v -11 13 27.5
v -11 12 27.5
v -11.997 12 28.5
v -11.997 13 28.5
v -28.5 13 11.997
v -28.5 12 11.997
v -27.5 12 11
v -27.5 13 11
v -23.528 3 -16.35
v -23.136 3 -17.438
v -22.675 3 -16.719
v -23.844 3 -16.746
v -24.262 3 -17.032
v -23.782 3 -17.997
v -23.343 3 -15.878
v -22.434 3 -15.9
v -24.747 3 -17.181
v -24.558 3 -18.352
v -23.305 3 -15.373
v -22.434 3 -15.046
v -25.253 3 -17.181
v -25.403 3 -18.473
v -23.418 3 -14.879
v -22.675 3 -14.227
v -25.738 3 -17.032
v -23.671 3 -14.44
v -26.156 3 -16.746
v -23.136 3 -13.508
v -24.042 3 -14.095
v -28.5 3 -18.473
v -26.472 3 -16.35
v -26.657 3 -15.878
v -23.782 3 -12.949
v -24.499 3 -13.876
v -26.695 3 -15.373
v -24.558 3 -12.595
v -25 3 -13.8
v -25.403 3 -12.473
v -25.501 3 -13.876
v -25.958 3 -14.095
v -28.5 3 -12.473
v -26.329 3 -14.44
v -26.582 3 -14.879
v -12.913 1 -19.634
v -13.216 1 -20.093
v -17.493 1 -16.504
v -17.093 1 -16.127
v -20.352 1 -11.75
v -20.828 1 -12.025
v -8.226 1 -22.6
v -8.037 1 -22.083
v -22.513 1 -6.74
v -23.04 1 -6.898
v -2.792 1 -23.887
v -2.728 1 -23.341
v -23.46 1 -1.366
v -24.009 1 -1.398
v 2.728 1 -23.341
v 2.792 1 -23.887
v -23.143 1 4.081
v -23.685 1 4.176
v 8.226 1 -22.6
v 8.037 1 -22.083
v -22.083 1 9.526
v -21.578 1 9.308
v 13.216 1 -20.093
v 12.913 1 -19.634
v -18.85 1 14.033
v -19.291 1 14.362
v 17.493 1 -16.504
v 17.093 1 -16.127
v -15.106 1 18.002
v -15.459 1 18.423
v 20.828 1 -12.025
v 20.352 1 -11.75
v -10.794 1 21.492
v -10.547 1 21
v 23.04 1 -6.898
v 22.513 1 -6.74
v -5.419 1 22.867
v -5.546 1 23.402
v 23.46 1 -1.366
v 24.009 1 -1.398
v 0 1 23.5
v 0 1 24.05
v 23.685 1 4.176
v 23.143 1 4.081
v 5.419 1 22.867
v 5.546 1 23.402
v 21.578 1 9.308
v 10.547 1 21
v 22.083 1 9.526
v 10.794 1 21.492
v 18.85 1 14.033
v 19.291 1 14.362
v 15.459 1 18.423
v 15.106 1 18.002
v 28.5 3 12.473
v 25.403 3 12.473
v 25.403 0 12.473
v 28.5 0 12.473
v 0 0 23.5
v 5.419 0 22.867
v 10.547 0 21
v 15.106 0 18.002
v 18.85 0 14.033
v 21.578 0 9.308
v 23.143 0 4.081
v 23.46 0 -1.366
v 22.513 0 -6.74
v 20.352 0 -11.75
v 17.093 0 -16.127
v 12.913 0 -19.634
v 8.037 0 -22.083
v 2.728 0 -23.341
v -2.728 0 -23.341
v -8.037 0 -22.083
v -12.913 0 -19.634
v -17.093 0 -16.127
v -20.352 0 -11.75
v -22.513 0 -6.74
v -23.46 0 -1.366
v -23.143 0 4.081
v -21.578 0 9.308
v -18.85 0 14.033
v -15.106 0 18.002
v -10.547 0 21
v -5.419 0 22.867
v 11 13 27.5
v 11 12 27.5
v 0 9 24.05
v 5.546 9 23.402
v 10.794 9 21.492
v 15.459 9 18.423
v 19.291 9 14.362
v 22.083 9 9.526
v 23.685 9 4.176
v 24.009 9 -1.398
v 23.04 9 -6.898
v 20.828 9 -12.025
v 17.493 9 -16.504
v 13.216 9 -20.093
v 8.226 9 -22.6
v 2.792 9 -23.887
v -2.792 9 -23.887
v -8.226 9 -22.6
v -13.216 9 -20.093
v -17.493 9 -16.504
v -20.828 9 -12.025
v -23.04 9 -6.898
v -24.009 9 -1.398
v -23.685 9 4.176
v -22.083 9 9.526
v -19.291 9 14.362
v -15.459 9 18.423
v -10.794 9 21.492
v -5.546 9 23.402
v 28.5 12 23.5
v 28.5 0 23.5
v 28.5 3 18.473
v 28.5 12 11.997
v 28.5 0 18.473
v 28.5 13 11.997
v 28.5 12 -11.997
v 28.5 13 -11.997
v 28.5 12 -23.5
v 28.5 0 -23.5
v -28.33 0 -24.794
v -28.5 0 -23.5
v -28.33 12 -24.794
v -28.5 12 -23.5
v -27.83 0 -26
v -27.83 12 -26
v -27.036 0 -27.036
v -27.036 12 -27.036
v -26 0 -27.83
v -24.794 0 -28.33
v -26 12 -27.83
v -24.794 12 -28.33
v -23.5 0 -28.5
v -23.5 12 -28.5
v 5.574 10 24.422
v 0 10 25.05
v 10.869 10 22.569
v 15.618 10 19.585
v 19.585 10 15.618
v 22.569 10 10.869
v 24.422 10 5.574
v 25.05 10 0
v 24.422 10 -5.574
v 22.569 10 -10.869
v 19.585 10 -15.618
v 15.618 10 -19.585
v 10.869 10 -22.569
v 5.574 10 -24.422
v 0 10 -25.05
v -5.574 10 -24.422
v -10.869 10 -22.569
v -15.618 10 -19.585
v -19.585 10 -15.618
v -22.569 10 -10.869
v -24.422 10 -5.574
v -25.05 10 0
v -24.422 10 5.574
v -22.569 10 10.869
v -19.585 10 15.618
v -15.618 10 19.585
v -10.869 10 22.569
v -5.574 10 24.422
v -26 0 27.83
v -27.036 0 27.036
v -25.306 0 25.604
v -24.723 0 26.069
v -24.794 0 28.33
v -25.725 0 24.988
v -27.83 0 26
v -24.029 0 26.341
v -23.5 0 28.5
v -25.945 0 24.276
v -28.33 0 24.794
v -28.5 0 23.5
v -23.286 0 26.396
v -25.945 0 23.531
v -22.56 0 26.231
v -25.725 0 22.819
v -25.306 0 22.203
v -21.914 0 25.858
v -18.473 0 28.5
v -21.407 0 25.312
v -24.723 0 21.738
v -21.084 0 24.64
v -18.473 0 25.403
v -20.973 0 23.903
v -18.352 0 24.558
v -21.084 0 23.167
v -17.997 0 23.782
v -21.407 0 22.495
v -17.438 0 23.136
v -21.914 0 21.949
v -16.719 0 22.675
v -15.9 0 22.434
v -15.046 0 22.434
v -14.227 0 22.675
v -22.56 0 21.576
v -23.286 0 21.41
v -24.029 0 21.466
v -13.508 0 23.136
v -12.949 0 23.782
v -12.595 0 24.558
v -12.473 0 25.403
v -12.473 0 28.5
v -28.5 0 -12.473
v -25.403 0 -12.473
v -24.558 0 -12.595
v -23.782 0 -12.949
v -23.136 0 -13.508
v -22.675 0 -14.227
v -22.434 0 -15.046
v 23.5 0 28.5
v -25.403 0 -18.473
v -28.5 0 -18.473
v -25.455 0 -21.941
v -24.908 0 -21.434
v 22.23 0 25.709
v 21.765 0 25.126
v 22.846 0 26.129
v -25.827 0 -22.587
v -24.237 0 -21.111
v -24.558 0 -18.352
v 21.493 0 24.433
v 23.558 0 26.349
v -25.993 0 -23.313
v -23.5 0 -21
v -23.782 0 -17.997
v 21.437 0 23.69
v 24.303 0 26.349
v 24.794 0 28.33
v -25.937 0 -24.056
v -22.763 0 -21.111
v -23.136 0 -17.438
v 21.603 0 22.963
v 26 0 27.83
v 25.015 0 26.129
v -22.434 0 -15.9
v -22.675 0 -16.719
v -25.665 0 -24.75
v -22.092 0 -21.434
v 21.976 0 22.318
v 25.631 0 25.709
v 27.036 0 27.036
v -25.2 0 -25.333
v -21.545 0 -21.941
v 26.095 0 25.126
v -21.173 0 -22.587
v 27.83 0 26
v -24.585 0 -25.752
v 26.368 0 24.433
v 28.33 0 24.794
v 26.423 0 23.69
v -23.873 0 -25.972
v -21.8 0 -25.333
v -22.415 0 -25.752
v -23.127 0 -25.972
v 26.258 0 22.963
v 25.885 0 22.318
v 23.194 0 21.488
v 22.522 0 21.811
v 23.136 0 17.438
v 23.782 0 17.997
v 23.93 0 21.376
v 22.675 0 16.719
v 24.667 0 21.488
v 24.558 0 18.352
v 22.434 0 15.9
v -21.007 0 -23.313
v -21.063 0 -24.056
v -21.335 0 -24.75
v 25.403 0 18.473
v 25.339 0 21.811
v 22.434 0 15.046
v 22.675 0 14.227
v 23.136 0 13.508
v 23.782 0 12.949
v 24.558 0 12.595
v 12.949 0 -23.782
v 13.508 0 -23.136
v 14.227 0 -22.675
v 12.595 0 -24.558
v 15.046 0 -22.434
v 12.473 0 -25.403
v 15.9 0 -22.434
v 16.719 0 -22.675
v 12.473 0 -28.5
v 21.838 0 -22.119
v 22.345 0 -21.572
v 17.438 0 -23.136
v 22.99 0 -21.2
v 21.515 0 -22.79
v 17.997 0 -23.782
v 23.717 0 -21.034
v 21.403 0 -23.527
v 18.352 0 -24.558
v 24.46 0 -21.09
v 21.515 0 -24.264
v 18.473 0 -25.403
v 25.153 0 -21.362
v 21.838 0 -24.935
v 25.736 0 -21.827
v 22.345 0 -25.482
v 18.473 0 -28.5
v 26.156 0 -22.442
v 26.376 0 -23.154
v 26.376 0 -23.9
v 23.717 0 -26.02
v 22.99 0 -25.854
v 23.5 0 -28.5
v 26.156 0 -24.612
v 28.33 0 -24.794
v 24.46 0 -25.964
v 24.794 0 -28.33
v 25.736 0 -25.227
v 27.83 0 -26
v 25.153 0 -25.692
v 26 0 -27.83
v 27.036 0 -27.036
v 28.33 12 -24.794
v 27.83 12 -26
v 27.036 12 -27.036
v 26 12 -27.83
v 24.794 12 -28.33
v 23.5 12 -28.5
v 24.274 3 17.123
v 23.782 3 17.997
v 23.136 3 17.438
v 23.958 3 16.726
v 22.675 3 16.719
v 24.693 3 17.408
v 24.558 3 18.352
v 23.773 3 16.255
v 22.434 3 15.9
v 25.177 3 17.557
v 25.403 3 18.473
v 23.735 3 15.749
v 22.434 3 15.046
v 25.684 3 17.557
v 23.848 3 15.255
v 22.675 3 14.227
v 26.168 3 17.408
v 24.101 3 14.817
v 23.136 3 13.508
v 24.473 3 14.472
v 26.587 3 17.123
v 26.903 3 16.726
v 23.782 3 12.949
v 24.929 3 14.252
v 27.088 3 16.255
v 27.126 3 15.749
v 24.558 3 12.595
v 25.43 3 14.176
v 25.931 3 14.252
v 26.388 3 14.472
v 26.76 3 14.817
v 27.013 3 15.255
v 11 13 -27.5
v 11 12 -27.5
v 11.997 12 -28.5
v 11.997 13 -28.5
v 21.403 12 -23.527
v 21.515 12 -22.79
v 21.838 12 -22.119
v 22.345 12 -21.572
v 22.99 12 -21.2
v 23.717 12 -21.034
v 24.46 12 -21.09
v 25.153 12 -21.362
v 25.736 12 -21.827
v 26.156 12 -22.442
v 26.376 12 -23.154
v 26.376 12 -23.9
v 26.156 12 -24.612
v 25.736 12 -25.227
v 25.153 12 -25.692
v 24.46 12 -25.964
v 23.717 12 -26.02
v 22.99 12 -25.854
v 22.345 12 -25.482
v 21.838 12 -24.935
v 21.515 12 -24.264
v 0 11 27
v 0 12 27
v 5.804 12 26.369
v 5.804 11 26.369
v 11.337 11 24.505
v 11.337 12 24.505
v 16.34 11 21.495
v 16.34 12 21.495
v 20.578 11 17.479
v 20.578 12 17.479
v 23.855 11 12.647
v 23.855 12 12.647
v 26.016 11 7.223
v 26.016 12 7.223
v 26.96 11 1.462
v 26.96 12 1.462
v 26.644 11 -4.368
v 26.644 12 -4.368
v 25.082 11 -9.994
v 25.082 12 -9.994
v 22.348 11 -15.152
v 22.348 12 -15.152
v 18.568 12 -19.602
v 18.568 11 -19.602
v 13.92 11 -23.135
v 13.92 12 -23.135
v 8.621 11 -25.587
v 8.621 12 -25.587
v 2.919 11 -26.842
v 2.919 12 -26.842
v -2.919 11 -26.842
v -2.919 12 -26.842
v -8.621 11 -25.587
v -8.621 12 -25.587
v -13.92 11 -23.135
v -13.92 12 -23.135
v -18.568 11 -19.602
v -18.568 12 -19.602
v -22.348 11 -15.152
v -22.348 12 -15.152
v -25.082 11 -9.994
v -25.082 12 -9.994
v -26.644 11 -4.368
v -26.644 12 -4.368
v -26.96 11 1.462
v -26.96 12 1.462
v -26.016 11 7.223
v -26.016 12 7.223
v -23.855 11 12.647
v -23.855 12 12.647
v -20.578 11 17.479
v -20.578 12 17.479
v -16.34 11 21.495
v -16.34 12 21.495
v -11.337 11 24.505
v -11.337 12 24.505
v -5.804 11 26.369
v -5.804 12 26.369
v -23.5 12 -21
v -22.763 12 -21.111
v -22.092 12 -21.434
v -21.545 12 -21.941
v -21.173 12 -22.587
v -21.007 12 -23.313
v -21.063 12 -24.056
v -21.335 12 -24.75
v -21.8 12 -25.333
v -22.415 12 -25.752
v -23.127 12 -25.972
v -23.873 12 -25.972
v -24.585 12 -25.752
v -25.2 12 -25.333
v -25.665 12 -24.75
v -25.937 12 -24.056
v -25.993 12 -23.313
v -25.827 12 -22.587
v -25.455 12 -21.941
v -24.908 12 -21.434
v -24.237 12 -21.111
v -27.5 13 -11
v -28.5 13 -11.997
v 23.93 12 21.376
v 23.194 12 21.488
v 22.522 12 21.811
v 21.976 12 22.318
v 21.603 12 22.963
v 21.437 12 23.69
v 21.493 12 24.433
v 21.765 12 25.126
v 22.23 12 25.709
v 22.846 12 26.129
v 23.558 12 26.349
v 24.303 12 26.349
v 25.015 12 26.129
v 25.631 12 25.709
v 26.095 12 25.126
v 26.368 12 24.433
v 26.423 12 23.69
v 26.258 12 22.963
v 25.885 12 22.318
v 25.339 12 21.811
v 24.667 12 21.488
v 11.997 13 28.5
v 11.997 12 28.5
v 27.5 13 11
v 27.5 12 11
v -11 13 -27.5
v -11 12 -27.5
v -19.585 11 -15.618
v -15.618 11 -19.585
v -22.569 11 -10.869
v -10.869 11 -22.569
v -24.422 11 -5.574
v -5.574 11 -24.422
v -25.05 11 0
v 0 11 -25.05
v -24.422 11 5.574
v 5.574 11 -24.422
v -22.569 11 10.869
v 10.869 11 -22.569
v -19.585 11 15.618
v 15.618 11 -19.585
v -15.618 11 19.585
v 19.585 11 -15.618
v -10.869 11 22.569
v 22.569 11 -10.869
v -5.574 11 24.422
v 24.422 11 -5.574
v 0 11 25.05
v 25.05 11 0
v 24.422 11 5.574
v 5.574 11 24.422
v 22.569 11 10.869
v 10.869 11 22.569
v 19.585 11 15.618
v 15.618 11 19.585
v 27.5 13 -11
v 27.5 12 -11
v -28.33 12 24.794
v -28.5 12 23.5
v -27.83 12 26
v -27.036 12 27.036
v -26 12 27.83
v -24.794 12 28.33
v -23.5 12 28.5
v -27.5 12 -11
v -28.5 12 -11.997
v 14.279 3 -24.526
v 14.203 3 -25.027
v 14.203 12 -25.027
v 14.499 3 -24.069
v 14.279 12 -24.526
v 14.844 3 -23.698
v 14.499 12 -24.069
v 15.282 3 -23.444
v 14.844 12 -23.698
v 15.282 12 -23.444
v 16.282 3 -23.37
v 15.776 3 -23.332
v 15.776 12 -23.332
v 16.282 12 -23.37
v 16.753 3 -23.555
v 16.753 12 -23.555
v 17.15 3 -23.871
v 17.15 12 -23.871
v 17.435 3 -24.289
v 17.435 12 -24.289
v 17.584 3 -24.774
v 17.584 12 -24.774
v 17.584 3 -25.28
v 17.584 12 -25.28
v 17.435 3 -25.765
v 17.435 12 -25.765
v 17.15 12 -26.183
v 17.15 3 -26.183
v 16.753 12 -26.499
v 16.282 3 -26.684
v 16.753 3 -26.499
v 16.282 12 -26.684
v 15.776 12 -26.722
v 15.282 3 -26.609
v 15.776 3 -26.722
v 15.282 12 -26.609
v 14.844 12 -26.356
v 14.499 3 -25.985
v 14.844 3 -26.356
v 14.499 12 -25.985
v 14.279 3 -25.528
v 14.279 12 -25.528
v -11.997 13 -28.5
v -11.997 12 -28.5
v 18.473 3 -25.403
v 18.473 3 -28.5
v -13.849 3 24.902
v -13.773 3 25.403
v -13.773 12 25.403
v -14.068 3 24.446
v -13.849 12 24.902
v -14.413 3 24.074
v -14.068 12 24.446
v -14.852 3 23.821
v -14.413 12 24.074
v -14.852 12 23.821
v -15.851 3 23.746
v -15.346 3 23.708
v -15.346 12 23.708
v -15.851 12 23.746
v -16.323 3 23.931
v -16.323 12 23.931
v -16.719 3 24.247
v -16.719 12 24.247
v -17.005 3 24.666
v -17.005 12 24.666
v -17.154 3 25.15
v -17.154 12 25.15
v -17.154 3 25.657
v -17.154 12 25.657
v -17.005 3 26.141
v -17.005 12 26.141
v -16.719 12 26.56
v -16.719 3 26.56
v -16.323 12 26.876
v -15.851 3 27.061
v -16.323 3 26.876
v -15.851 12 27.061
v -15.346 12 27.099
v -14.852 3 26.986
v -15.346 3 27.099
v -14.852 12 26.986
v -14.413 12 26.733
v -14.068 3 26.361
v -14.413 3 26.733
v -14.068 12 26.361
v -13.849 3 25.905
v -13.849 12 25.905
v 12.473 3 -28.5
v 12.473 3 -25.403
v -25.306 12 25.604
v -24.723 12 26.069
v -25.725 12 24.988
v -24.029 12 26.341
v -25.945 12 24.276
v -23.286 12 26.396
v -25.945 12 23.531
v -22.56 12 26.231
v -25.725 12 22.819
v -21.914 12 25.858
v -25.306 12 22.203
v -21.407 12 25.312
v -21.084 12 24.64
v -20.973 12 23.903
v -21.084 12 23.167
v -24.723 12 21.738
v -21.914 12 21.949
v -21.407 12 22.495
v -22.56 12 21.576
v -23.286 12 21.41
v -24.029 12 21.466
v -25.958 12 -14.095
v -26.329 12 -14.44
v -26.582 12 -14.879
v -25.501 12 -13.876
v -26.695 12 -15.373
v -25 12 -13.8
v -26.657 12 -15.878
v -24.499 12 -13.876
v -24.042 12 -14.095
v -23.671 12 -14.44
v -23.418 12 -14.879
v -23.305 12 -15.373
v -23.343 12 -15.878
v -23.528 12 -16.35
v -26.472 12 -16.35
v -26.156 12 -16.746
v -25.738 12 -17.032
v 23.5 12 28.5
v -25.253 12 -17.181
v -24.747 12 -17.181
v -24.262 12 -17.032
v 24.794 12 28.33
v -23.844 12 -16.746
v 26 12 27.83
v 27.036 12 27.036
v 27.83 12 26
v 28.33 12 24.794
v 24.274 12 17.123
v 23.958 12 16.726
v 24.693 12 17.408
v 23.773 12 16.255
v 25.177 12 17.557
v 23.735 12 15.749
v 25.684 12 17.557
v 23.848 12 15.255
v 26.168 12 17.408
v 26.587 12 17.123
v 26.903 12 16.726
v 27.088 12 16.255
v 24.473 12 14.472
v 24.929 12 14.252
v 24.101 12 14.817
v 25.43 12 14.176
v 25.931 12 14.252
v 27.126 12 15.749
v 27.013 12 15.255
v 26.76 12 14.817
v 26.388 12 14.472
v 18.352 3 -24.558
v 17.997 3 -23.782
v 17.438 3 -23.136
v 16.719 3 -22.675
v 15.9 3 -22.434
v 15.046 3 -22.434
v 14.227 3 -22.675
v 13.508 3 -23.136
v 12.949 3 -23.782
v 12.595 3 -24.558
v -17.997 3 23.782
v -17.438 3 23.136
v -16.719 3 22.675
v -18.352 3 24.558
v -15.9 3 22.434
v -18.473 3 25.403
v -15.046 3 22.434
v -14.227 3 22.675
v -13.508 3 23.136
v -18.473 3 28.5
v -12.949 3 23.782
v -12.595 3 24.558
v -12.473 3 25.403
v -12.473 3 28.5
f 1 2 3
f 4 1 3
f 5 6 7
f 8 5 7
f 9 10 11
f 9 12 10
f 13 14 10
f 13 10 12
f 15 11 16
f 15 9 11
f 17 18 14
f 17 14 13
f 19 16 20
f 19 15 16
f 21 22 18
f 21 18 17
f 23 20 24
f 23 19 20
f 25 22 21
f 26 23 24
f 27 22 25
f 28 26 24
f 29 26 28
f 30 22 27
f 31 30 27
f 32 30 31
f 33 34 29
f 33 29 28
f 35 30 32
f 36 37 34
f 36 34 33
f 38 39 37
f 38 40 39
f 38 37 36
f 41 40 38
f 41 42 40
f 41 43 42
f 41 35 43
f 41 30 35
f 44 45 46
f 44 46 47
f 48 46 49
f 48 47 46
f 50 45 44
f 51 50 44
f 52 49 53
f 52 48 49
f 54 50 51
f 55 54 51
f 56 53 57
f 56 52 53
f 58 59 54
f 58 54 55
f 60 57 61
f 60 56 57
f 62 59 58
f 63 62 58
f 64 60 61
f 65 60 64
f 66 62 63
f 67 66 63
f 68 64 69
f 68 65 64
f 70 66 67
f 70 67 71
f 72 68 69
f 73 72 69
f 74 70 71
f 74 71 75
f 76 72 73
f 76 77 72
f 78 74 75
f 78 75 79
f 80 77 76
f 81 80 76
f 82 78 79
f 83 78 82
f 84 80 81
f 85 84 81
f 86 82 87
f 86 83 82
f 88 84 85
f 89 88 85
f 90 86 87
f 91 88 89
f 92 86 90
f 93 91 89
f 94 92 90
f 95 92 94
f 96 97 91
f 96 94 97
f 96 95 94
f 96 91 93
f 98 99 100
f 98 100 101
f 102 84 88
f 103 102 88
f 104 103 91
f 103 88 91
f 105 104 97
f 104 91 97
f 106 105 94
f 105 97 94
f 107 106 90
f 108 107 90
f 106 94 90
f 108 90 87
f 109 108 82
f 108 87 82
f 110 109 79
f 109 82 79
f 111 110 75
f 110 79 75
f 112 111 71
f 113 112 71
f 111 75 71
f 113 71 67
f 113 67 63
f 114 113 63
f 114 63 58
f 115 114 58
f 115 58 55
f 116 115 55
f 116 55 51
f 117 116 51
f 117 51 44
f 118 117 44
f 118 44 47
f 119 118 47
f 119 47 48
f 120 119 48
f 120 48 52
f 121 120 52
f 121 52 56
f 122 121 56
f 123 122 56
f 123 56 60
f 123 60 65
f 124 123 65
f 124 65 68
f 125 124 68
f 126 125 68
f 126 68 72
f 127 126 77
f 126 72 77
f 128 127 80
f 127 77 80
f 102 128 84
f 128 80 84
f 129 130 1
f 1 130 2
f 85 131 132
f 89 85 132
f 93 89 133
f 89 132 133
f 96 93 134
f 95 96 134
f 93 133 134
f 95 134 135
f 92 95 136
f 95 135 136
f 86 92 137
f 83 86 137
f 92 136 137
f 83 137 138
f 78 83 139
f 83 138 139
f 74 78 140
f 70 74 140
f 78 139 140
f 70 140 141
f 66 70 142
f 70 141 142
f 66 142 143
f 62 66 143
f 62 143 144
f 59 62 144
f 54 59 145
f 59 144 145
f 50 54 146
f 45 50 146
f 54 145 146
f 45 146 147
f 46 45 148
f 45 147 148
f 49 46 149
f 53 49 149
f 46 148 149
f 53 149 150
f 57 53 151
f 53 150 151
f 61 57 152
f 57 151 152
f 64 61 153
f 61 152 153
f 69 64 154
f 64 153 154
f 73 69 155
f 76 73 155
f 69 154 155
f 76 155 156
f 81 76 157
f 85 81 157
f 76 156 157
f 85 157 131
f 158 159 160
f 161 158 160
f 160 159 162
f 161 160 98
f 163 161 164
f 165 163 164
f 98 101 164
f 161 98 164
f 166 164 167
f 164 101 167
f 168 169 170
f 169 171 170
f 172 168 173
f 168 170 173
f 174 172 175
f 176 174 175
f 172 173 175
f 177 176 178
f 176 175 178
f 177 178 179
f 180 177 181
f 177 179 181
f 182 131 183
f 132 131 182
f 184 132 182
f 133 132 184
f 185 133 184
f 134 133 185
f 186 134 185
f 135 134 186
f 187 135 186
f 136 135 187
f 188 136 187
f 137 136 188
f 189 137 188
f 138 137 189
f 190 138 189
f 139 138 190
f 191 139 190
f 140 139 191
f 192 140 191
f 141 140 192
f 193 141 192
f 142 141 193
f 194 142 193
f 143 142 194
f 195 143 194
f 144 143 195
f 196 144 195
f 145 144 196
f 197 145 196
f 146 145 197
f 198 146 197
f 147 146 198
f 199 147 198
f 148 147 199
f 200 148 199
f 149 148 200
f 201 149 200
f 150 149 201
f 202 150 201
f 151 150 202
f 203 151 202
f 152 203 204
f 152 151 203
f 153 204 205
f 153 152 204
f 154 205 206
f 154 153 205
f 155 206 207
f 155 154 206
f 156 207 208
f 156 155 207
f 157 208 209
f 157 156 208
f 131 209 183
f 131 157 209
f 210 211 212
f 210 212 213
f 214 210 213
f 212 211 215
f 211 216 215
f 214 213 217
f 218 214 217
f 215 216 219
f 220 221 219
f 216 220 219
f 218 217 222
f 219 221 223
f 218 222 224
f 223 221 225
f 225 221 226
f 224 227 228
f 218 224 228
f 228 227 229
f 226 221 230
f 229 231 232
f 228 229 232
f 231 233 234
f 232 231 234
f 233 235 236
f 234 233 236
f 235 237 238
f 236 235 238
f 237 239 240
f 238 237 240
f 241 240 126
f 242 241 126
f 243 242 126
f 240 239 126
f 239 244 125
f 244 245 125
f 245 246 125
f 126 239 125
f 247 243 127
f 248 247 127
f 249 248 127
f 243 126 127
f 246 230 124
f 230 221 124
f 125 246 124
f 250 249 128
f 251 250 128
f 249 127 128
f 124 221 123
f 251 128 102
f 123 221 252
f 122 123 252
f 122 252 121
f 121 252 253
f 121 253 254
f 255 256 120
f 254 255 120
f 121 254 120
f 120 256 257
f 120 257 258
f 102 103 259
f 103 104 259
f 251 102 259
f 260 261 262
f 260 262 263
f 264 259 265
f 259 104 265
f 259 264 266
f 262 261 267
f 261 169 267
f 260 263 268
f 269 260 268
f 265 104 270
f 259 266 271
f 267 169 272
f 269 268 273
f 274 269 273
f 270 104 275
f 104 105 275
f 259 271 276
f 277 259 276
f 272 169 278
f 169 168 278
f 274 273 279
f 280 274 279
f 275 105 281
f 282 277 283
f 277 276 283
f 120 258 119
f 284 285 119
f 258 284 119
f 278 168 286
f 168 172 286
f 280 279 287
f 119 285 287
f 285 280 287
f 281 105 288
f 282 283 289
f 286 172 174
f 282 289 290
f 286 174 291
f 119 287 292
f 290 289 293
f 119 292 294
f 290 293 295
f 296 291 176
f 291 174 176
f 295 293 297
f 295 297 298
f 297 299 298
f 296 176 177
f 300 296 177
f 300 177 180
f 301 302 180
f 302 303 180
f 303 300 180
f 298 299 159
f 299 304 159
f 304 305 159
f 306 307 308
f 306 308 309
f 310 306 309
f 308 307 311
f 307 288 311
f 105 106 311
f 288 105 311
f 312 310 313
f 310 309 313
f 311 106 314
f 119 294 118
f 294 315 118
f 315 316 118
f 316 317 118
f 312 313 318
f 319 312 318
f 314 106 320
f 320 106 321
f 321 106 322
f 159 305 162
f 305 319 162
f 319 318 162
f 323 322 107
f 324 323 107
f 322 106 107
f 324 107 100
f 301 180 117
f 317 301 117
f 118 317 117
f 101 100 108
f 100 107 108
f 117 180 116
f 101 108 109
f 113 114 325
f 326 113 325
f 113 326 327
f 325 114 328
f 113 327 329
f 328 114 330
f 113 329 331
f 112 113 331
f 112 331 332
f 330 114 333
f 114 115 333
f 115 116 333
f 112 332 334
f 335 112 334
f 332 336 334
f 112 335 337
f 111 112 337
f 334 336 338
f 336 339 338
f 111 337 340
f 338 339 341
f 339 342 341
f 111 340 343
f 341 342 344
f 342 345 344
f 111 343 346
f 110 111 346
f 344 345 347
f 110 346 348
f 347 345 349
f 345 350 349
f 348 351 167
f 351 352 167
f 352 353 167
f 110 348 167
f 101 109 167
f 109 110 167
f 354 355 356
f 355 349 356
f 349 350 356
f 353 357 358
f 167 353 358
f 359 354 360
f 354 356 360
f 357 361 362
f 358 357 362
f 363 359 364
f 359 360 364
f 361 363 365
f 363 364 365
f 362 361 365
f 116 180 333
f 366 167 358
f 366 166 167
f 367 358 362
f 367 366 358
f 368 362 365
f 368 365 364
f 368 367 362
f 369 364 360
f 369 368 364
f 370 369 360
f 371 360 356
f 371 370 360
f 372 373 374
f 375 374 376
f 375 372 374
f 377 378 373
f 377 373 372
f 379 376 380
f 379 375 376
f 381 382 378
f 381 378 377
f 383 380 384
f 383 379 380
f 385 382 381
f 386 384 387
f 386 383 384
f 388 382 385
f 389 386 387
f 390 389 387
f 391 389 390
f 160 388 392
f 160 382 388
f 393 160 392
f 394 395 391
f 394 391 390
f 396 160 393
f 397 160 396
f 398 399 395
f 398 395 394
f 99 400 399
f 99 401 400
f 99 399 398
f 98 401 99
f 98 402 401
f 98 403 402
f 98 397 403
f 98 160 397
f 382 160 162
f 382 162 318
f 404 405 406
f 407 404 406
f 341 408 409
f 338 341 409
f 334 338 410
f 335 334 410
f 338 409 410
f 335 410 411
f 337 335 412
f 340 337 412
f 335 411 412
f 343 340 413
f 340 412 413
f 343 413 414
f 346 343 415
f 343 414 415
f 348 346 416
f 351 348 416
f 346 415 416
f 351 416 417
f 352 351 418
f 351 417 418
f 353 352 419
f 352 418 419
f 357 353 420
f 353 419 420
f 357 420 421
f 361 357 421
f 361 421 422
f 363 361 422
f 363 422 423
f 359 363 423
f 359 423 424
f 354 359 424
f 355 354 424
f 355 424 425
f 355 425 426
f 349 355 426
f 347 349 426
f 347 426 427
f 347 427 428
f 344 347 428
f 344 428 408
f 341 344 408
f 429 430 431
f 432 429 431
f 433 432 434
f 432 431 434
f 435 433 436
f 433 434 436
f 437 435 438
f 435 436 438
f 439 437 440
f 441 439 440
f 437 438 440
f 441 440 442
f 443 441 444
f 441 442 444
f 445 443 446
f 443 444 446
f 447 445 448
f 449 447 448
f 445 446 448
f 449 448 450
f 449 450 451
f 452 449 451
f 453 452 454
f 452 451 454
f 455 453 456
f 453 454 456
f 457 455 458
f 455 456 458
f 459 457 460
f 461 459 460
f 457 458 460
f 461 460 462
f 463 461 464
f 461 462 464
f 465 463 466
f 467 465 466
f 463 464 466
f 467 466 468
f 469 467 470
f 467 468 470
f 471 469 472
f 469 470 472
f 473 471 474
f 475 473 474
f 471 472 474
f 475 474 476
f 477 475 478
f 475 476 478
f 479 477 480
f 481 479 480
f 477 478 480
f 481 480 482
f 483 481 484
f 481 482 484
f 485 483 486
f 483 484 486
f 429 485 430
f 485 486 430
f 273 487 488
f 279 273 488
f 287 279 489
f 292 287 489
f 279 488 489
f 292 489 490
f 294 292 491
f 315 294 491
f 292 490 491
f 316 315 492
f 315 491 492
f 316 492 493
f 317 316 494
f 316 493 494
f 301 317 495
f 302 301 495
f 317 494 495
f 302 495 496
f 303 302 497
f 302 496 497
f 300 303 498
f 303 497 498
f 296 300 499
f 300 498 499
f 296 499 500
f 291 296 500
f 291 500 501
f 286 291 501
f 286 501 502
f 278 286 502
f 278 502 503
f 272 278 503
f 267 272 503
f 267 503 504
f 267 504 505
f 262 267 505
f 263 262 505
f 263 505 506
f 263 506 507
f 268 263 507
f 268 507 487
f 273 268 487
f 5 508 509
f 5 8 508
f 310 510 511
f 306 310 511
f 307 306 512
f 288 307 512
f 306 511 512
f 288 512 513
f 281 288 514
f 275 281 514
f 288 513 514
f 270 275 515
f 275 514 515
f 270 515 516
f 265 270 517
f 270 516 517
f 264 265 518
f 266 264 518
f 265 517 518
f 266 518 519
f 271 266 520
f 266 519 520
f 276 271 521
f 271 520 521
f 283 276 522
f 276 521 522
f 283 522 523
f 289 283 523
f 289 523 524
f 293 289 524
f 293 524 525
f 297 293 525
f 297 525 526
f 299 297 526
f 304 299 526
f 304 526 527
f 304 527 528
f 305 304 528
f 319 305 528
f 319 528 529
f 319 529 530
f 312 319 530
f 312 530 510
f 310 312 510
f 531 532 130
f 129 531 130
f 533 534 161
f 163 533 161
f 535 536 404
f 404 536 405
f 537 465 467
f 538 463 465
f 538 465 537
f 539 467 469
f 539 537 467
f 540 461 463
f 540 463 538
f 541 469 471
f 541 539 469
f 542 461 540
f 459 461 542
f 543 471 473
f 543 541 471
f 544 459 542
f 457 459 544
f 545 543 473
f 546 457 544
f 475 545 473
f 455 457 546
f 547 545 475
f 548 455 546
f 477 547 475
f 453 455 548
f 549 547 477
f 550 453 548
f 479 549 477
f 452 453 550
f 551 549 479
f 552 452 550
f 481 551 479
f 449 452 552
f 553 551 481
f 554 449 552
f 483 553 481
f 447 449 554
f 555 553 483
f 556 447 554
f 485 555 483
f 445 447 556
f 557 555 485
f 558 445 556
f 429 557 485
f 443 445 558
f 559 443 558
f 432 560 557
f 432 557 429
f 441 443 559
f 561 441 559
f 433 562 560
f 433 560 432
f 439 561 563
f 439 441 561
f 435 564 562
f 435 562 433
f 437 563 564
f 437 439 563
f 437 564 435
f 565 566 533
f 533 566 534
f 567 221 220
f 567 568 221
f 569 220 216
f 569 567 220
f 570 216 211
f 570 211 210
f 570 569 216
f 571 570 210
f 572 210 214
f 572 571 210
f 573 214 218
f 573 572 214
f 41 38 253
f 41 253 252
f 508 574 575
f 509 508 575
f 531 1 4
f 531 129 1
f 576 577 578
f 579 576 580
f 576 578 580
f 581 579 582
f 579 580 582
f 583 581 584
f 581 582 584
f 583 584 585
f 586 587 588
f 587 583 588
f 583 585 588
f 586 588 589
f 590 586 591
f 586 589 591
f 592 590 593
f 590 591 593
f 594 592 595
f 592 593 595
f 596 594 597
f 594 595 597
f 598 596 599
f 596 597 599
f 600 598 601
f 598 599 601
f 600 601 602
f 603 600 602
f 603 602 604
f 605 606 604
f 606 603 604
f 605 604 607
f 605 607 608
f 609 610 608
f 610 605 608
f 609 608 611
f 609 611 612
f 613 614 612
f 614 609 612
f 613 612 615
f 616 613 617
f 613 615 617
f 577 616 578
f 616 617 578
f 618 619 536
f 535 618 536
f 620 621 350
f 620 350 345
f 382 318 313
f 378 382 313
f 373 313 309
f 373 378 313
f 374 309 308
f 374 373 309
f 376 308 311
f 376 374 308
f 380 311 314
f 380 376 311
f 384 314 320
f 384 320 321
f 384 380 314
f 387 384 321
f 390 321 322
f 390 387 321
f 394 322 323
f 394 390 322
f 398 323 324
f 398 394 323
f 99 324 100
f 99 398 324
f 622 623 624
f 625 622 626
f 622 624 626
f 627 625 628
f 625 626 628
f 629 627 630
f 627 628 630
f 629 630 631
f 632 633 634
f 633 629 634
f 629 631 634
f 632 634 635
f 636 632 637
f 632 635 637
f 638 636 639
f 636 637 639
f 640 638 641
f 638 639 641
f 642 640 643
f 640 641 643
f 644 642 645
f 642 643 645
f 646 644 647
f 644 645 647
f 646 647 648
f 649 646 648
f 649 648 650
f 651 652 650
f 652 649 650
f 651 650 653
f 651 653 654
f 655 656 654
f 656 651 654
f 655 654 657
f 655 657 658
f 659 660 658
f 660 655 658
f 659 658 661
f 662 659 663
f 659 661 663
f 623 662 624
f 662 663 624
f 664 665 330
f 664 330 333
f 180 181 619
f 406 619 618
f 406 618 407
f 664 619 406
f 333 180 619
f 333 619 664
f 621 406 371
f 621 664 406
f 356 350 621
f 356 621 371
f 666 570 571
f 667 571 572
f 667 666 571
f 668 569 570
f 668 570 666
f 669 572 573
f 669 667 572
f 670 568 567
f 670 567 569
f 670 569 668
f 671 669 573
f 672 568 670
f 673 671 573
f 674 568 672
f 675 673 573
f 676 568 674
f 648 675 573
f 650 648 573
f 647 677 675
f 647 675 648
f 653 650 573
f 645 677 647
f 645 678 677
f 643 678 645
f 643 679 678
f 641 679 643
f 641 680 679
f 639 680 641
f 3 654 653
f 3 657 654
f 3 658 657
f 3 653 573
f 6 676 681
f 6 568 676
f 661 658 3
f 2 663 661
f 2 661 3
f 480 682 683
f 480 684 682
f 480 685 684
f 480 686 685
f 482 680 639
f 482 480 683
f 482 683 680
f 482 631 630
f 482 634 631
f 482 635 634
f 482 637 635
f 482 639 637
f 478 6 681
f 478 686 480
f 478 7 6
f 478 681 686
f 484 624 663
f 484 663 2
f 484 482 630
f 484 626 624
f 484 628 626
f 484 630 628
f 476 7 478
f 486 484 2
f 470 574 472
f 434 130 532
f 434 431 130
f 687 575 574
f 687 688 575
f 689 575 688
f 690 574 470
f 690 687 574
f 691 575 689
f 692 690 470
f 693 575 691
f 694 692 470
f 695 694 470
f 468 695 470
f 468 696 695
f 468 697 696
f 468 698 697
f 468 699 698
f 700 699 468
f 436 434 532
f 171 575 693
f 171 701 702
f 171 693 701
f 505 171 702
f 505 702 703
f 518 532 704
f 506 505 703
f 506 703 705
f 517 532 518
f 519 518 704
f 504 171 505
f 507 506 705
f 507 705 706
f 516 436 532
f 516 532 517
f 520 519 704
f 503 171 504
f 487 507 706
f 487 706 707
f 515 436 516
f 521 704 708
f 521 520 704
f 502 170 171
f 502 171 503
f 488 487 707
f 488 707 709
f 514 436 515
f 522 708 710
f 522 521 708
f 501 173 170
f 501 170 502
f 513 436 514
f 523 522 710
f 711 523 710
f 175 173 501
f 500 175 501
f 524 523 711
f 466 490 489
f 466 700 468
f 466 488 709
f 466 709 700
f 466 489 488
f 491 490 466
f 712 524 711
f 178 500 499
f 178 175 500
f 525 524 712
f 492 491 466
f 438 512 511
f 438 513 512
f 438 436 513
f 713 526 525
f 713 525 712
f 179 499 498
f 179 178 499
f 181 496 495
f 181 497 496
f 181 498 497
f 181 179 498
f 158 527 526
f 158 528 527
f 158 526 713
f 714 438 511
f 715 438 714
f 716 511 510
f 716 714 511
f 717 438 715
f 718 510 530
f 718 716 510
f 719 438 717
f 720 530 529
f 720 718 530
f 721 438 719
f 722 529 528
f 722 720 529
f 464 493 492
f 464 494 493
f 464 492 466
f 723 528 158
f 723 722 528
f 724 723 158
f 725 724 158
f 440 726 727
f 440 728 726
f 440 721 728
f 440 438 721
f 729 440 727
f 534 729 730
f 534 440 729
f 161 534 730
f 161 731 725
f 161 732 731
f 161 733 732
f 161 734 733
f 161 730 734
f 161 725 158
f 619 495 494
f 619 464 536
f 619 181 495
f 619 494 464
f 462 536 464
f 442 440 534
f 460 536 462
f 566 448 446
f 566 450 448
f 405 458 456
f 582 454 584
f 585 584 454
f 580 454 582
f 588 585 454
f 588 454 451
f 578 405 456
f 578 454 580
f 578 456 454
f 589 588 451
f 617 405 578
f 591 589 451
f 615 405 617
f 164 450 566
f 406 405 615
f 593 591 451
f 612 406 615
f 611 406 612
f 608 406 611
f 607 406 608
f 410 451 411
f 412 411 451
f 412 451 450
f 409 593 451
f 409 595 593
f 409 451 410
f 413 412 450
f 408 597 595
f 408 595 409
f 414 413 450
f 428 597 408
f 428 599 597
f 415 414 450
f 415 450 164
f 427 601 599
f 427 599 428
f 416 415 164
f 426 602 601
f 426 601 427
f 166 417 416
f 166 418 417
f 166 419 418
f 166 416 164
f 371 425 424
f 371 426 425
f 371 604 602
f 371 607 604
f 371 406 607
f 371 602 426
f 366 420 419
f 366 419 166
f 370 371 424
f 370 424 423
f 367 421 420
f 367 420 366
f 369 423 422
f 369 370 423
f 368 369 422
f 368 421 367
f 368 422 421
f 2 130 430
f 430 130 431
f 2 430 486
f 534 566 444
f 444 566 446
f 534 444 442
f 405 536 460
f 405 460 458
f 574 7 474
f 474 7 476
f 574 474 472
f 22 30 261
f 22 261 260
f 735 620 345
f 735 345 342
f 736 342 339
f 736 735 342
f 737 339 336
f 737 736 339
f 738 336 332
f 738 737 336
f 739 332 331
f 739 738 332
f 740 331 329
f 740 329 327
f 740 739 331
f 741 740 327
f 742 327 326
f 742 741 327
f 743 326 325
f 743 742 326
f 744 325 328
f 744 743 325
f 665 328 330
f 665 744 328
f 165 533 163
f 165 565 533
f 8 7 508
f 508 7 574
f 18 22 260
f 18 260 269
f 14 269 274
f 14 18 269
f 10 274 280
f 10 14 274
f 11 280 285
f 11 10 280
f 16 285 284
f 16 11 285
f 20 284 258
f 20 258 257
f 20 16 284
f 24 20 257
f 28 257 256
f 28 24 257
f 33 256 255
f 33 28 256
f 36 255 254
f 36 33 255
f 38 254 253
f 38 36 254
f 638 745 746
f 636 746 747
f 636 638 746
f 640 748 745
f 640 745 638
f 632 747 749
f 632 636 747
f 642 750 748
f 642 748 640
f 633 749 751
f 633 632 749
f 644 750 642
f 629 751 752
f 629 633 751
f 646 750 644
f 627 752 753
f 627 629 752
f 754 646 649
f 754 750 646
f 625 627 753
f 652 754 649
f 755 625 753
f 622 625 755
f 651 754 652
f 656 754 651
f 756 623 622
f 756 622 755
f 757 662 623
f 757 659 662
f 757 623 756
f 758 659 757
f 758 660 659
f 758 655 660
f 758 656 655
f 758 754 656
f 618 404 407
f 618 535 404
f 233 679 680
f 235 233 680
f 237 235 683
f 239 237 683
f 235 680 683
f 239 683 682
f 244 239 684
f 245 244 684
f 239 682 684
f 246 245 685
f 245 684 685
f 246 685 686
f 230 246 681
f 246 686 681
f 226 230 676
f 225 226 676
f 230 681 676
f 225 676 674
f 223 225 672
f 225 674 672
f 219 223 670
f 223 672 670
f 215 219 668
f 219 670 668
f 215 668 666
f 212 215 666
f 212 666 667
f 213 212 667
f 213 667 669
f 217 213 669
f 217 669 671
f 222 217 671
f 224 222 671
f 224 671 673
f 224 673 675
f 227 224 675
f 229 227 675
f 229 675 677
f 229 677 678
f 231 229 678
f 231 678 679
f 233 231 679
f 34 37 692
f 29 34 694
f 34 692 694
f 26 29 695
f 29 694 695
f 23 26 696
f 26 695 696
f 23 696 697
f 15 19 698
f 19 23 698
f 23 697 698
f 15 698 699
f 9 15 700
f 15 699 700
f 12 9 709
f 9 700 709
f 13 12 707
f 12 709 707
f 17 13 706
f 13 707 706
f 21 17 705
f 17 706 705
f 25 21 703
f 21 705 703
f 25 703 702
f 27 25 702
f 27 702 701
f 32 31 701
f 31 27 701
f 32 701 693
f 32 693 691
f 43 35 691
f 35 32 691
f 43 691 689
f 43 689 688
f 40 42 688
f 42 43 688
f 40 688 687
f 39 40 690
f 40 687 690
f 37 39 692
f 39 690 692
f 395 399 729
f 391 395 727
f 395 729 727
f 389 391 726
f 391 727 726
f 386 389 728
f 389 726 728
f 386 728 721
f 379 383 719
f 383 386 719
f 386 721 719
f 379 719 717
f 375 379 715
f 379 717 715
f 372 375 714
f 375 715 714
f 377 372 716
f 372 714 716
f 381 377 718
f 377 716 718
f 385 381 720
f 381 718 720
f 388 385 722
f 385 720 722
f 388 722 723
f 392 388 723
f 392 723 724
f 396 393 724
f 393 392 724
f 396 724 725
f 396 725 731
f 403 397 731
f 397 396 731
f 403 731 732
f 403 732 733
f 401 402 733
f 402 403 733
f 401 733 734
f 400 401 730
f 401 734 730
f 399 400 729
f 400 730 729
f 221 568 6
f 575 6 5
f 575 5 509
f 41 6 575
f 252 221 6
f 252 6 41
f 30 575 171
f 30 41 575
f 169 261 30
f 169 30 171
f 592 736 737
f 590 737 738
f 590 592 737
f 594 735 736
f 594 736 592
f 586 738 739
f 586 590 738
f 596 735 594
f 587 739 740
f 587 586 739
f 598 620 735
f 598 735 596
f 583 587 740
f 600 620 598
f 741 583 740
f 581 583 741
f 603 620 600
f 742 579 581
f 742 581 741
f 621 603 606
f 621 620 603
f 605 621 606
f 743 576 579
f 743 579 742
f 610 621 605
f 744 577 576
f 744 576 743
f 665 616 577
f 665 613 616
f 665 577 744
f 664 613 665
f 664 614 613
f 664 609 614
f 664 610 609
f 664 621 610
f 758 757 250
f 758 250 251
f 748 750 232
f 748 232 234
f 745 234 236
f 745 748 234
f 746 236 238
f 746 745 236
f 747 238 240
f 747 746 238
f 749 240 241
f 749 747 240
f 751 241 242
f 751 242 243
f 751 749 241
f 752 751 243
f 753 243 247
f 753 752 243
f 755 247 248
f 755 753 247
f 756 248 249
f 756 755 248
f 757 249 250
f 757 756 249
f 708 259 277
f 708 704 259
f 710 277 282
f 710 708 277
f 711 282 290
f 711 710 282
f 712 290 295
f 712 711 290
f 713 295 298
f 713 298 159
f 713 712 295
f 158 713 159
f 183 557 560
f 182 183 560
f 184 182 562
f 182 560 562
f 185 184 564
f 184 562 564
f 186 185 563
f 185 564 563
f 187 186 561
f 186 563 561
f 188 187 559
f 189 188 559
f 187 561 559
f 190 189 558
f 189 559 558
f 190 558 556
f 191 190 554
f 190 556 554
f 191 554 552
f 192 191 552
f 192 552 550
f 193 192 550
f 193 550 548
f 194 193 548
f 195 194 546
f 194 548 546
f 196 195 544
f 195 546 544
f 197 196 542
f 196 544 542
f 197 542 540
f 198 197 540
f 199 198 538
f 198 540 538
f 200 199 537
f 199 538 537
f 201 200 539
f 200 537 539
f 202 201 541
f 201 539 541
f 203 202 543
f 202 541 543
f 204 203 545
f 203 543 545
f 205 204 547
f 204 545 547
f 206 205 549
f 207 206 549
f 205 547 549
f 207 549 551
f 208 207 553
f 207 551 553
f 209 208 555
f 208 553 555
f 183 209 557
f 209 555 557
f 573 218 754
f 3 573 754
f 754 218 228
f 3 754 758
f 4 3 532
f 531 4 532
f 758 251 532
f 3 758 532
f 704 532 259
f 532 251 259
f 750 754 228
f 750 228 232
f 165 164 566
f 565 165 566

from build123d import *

# Parameters (mm, degrees)
SKETCH1_W           = 57
SKETCH1_H           = 57
BOSS_EXTRUDE1_DEPTH = 12
FILLET1_R           = 5
SKETCH2_R           = 2.5
SKETCH2_R_2         = 1.7
CUT_EXTRUDE1_DEPTH  = 43.053537307
CIRPATTERN2_COUNT   = 4
SKETCH3_R           = 27
CUT_EXTRUDE2_DEPTH  = 1
SKETCH4_R           = 25.05
CUT_EXTRUDE3_DEPTH  = 2
CHAMFER1_SIZE       = 1
SKETCH5_R           = 24.05
CUT_EXTRUDE4_DEPTH  = 8
SKETCH6_R           = 23.5
CUT_EXTRUDE5_DEPTH  = 2
BOSS_EXTRUDE2_DEPTH = 1
CIRPATTERN3_COUNT   = 4
CUT_EXTRUDE8_START  = -3
SKETCH9_R           = 3
SKETCH9_R_2         = 1.7
CUT_EXTRUDE8_DEPTH  = 3
CIRPATTERN6_COUNT   = 4


with BuildPart() as part:
    # Sketch1 → Boss-Extrude1 (new body)
    with BuildSketch(Plane(origin=(0, 0, 0), x_dir=(1, 0, 0), z_dir=(0, 1, 0))):
        Rectangle(SKETCH1_W, SKETCH1_H)
    extrude(amount=BOSS_EXTRUDE1_DEPTH)

    # Fillet1
    fillet1_edges = [part.edges().sort_by_distance(p)[0] for p in [
        (-28.5, 6, -28.5),
        (28.5, 6, -28.5),
        (28.5, 6, 28.5),
        (-28.5, 6, 28.5),
    ]]
    fillet(fillet1_edges, radius=FILLET1_R)

    # Sketch2 → Cut-Extrude1 (cut, through all)
    with BuildSketch(Plane(origin=(0, 12, 0), x_dir=(1, 0, 0), z_dir=(0, 1, 0))):
        with Locations(Location((-23.5, 23.5, 0), (0, 0, 270))):
            Circle(SKETCH2_R)
        with Locations(Location((-25, 15.5, 0), (0, 0, 270))):
            Circle(SKETCH2_R_2)
    cut_extrude1 = extrude(amount=-CUT_EXTRUDE1_DEPTH, mode=Mode.SUBTRACT)

    # CirPattern2: Cut-Extrude1 ×4 about axis
    cirpattern2_axis = Axis((0.215204442, 0, 0.188240663), (0, 1, 0))
    for i in range(1, CIRPATTERN2_COUNT):
        add(cut_extrude1.rotate(cirpattern2_axis, i * 360 / CIRPATTERN2_COUNT), mode=Mode.SUBTRACT)

    # Sketch3 → Cut-Extrude2 (cut)
    with BuildSketch(Plane(origin=(0, 12, 0), x_dir=(1, 0, 0), z_dir=(0, 1, 0))):
        with Locations(Location((0, 0, 0), (0, 0, 270))):
            Circle(SKETCH3_R)
    extrude(amount=-CUT_EXTRUDE2_DEPTH, mode=Mode.SUBTRACT)

    # Sketch4 → Cut-Extrude3 (cut)
    with BuildSketch(Plane(origin=(0, 11, 0), x_dir=(1, 0, 0), z_dir=(0, 1, 0))):
        with Locations(Location((0, 0, 0), (0, 0, 270))):
            Circle(SKETCH4_R)
    extrude(amount=-CUT_EXTRUDE3_DEPTH, mode=Mode.SUBTRACT)

    # Chamfer1
    chamfer1_edges = [part.edges().sort_by_distance(p)[0] for p in [
        (0, 9, -25.05),
    ]]
    chamfer(chamfer1_edges, length=CHAMFER1_SIZE)

    # Sketch5 → Cut-Extrude4 (cut)
    with BuildSketch(Plane(origin=(0, 9, 0), x_dir=(1, 0, 0), z_dir=(0, 1, 0))):
        with Locations(Location((0, 0, 0), (0, 0, 270))):
            Circle(SKETCH5_R)
    extrude(amount=-CUT_EXTRUDE4_DEPTH, mode=Mode.SUBTRACT)

    # Sketch6 → Cut-Extrude5 (cut)
    with BuildSketch(Plane(origin=(0, 1, 0), x_dir=(1, 0, 0), z_dir=(0, 1, 0))):
        with Locations(Location((0, 0, 0), (0, 0, 270))):
            Circle(SKETCH6_R)
    extrude(amount=-CUT_EXTRUDE5_DEPTH, mode=Mode.SUBTRACT)

    # Sketch7 → Boss-Extrude2 (add)
    with BuildSketch(Plane(origin=(0, 12, 0), x_dir=(1, 0, 0), z_dir=(0, 1, 0))):
        Polygon((27.5, 0), (27.5, -11), (28.5, -11.996579712), (28.5, 0), align=None)
        Polygon((27.5, 11), (27.5, 0), (28.5, 0), (28.5, 11.996579712), align=None)
    boss_extrude2 = extrude(amount=BOSS_EXTRUDE2_DEPTH)

    # CirPattern3: Boss-Extrude2 ×4 about axis
    cirpattern3_axis = Axis((0, 0, 0), (0, 1, 0))
    for i in range(1, CIRPATTERN3_COUNT):
        add(boss_extrude2.rotate(cirpattern3_axis, i * 360 / CIRPATTERN3_COUNT))

    # Sketch9 → Cut-Extrude8 (cut)
    # profile 1 of 3: a face of its own
    with BuildSketch(Plane.XZ.offset(CUT_EXTRUDE8_START)):
        with Locations((-15.473036222, 25.403445105)):
            Circle(SKETCH9_R)
        with Locations((-15.473036222, 25.403445105)):
            Circle(SKETCH9_R_2, mode=Mode.SUBTRACT)
    # profile 2 of 3: a face of its own
    with BuildSketch(Plane.XZ.offset(CUT_EXTRUDE8_START)):
        with BuildLine():
            ThreePointArc((-18.473036222, 25.403445105), (-15.473036222, 28.403445105), (-12.473036222, 25.403445105))
            Line((-12.473036222, 25.403445105), (-12.473036222, 28.424359567))
            Line((-12.473036222, 28.424359567), (-12.473036222, 28.5))
            Line((-12.473036222, 28.5), (-18.473036222, 28.5))
            Line((-18.473036222, 28.5), (-18.473036222, 25.403445105))
        make_face()
    # profile 3 of 3: a face of its own
    with BuildSketch(Plane.XZ.offset(CUT_EXTRUDE8_START)):
        with Locations((-15.473036222, 25.403445105)):
            Circle(SKETCH9_R_2)
    cut_extrude8 = extrude(amount=CUT_EXTRUDE8_DEPTH, mode=Mode.SUBTRACT)

    # CirPattern6: Cut-Extrude8 ×4 about axis
    cirpattern6_axis = Axis((0, 0, 0), (0, 1, 0))
    for i in range(1, CIRPATTERN6_COUNT):
        add(cut_extrude8.rotate(cirpattern6_axis, i * 360 / CIRPATTERN6_COUNT), mode=Mode.SUBTRACT)


solid = part.part
